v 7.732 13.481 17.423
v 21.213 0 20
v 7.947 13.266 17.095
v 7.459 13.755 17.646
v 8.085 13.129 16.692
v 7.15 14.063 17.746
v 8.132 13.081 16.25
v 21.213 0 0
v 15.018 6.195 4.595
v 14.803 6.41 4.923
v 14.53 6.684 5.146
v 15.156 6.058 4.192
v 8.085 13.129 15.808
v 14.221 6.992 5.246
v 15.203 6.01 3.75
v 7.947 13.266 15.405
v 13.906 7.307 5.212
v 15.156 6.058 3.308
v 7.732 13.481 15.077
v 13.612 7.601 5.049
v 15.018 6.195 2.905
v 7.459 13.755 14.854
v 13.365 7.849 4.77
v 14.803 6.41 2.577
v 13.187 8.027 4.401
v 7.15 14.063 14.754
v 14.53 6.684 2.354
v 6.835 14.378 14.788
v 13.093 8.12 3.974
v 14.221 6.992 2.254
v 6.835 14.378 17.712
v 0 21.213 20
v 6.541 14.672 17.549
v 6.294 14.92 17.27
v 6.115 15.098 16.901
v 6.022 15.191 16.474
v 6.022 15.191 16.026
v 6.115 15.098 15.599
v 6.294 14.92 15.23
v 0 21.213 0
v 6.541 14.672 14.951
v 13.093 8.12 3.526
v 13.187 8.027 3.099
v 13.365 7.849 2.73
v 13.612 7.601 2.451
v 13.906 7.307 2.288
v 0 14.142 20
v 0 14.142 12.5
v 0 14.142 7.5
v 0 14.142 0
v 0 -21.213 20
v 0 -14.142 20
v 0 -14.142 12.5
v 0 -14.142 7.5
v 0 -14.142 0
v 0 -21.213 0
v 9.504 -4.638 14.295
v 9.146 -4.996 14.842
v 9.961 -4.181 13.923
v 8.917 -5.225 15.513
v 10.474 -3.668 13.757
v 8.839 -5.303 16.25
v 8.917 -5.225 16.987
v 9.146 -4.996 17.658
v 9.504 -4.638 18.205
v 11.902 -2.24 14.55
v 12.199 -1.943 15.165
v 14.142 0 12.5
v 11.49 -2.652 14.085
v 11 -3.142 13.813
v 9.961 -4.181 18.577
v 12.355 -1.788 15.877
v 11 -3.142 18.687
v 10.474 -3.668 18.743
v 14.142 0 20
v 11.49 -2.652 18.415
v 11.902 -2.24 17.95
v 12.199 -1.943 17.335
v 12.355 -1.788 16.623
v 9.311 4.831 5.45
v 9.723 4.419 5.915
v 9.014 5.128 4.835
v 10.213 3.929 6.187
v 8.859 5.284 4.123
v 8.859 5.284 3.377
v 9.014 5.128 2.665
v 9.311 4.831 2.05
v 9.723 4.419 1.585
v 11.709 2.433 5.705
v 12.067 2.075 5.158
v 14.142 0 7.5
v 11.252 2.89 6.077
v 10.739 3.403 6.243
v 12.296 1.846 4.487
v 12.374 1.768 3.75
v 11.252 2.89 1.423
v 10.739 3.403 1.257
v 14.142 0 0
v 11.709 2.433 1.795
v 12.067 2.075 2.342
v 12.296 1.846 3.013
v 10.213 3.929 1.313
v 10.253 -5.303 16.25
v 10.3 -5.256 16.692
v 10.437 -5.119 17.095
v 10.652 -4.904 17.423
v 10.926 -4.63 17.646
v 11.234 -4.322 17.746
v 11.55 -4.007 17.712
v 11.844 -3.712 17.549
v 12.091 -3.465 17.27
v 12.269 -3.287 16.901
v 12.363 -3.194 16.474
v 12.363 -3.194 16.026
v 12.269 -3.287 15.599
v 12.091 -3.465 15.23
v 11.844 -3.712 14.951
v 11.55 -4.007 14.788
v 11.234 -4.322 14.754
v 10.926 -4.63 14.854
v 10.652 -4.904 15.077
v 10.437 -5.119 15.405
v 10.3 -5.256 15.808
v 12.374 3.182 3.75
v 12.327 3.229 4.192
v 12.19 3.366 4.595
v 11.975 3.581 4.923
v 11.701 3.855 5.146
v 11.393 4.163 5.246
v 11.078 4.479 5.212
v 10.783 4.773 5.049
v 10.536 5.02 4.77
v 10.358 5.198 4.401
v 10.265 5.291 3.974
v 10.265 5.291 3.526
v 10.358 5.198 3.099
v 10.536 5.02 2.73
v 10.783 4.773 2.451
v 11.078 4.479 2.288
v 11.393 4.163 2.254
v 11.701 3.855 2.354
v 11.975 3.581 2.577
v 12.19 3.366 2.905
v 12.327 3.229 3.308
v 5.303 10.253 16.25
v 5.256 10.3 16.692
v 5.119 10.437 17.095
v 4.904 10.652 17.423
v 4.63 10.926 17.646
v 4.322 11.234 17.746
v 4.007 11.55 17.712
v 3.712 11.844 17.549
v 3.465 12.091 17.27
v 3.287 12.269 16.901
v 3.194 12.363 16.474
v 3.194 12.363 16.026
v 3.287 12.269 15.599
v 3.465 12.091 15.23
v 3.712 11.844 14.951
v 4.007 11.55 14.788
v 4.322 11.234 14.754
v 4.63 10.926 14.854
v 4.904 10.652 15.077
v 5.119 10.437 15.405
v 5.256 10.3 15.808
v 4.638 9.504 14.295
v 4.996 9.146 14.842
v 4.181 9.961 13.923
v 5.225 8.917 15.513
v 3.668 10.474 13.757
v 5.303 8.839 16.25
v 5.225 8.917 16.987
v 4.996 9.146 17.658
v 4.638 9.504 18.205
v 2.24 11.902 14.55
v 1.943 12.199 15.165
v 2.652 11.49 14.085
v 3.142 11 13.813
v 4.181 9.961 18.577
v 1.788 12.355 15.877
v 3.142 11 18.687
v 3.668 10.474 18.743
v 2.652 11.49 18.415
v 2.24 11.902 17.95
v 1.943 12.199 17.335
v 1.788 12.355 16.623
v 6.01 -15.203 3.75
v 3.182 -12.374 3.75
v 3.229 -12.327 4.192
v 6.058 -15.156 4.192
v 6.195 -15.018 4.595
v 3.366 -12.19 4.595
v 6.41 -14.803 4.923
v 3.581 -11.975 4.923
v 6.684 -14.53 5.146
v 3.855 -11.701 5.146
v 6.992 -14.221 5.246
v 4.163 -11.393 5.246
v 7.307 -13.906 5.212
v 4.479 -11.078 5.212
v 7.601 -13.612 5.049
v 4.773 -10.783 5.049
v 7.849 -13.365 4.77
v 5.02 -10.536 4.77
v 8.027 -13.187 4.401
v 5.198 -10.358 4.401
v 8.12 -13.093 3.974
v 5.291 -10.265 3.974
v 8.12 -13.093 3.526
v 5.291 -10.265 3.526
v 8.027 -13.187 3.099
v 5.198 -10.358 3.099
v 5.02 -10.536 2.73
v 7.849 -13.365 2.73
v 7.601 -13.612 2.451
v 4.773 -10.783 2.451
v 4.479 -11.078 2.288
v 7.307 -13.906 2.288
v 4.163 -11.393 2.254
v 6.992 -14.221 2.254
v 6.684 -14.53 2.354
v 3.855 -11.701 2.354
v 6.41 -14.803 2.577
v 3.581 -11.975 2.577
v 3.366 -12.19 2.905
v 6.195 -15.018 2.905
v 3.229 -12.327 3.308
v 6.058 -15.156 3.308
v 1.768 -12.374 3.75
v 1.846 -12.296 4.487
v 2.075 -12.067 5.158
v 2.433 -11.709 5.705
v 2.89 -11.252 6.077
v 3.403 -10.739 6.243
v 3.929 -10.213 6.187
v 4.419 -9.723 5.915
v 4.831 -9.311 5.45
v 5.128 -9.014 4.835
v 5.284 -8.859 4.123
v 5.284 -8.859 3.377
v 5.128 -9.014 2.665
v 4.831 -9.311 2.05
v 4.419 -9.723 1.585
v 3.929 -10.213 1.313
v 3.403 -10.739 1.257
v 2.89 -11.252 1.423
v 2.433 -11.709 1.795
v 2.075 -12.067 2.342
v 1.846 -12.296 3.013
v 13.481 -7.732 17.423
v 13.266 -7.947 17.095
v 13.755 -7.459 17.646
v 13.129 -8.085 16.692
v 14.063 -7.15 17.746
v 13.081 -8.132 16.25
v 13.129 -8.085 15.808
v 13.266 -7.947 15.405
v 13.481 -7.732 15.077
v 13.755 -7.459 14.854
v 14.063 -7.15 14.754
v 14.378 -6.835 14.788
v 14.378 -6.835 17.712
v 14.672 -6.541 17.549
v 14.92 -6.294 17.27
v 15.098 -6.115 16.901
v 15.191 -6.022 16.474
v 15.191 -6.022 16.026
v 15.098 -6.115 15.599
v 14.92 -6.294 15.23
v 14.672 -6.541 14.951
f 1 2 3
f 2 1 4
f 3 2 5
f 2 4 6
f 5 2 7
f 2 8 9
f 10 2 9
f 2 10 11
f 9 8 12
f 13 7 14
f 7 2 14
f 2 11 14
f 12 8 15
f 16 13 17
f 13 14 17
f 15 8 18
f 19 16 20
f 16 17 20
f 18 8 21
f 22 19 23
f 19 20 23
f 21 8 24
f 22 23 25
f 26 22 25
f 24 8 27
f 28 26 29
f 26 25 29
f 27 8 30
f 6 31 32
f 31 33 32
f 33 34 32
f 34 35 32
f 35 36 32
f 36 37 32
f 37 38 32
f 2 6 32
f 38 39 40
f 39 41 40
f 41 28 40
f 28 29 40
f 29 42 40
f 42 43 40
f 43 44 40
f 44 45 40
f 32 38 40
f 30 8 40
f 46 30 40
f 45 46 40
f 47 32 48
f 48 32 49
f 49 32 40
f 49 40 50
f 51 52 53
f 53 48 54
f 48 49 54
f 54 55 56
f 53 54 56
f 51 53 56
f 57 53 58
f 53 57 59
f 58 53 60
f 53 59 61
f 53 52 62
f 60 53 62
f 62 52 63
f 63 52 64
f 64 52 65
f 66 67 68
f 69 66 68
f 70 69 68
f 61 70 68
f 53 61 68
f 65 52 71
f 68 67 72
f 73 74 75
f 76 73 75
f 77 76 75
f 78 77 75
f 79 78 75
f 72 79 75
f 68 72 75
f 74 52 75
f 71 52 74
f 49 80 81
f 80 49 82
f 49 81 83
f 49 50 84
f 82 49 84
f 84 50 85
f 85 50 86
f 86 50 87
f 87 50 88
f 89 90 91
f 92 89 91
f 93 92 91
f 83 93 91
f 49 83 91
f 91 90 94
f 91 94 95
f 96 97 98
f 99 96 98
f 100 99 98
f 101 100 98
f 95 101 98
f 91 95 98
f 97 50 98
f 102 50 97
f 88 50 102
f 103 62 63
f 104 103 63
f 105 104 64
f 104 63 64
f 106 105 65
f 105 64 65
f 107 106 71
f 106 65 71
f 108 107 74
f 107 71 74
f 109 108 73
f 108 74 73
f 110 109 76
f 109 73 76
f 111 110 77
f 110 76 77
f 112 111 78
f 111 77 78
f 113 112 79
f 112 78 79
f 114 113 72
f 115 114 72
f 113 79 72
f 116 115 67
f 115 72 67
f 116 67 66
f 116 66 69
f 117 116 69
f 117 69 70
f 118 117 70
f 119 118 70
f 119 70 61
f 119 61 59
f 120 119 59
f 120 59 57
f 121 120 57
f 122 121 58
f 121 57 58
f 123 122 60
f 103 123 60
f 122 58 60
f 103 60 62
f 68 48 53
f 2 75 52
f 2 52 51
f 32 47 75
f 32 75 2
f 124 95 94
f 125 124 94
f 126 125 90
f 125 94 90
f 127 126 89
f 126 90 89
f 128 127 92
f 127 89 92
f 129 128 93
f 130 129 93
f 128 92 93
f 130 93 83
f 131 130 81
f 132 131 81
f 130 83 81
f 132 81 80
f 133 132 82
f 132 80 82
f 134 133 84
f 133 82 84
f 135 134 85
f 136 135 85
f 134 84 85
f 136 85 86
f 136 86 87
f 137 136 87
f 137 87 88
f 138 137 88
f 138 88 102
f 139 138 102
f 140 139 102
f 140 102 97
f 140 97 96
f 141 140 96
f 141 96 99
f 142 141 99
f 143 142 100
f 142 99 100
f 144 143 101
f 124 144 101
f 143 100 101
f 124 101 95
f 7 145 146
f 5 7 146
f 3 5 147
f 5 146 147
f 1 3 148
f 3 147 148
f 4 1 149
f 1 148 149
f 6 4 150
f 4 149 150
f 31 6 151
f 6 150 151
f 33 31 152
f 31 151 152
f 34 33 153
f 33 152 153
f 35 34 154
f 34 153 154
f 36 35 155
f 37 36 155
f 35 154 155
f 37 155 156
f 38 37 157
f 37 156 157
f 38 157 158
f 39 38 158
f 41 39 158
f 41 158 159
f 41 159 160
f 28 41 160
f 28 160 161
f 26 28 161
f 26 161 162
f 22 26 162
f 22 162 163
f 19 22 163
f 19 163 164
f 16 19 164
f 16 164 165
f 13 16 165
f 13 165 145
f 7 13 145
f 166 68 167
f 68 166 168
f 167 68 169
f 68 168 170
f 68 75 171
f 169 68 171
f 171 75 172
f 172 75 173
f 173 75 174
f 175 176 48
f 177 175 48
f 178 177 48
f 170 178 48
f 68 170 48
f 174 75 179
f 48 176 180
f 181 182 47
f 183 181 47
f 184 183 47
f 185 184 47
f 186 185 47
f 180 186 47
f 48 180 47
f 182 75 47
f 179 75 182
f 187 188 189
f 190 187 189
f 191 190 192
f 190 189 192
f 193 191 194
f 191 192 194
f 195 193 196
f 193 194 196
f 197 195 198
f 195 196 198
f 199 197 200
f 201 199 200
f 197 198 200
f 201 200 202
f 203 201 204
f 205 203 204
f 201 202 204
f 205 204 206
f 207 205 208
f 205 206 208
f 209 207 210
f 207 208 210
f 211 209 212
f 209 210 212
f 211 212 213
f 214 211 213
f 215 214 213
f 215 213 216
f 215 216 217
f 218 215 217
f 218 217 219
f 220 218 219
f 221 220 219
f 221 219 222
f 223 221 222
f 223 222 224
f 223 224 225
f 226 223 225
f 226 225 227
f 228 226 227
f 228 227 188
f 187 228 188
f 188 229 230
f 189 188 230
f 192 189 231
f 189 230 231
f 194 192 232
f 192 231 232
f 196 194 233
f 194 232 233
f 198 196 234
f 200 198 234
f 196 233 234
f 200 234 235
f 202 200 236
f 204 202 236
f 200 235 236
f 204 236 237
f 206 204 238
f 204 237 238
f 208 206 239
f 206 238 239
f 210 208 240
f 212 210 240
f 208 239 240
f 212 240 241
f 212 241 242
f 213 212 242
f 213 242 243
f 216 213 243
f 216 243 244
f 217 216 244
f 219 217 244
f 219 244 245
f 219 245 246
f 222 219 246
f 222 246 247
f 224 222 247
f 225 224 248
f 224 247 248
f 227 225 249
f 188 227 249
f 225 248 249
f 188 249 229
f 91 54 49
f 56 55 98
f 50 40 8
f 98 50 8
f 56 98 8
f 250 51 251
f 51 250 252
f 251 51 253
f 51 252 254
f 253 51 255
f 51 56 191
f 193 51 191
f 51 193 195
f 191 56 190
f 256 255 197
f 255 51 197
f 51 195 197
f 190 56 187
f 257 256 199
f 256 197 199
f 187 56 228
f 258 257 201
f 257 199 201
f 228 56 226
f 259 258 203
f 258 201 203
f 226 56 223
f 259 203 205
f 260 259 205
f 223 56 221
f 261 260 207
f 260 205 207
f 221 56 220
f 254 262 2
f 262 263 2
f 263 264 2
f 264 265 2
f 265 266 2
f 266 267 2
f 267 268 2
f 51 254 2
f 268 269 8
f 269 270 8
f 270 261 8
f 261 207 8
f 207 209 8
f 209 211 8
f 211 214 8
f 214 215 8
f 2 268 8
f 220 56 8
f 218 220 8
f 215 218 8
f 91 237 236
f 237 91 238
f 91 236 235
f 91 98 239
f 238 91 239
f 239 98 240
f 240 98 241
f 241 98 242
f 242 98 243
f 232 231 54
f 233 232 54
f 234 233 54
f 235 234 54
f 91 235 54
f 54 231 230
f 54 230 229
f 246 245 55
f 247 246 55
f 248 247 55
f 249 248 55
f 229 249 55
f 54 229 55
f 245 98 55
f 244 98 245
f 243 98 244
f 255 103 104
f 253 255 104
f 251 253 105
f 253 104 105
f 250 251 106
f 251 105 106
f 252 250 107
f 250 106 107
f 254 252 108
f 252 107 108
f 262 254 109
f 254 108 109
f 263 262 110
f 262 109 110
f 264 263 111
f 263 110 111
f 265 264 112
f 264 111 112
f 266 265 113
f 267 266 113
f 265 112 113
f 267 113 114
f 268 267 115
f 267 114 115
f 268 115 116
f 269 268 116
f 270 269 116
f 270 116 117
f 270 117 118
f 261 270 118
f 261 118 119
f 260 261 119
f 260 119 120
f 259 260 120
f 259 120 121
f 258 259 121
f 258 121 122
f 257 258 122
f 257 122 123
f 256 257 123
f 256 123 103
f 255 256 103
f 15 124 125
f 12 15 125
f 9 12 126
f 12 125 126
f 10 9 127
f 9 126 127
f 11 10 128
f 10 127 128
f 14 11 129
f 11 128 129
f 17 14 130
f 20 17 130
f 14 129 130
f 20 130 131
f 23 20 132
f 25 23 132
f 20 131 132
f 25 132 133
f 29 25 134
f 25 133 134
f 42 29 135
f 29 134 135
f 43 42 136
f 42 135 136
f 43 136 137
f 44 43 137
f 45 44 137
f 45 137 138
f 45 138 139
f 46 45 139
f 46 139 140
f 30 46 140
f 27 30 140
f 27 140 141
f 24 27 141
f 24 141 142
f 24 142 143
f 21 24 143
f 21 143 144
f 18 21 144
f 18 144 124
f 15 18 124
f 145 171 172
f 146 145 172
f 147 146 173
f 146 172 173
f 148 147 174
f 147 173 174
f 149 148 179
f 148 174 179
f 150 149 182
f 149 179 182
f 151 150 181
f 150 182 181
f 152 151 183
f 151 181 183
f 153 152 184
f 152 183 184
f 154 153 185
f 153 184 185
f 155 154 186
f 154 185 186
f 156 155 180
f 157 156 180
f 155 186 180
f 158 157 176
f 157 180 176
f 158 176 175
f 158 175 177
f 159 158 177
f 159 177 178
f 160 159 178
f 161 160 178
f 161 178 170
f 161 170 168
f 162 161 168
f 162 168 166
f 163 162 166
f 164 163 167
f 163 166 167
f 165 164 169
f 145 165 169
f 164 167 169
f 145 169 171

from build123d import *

# Parameters (mm, degrees)
PAD_DEPTH       = 20
POCKET_DEPTH    = 7.5
POCKET001_DEPTH = 7.5
SKETCH003_R     = 1.5
POCKET002_DEPTH = 5
SKETCH004_R     = 1.5
POCKET003_DEPTH = 5
CHAMFER_SIZE    = 1


with BuildPart() as part:
    # Sketch → Pad (new body)
    with BuildSketch(Plane.XY):
        Polygon((21.213203, 0), (0, 21.213203), (0, -21.213203), align=None)
    extrude(amount=PAD_DEPTH)

    # Sketch001 (on Face5 of Pad) → Pocket (cut)
    with BuildSketch(Plane.XY.offset(20)):
        Polygon((14.142136, 0), (0, 14.142136), (0, -14.142136), align=None)
    extrude(amount=-POCKET_DEPTH, mode=Mode.SUBTRACT)

    # Sketch002 (on Face4 of Pocket) → Pocket001 (cut)
    with BuildSketch(Plane(origin=(0, 0, 0), x_dir=(1, 0, 0), z_dir=(0, 0, -1))):
        Polygon((14.142136, 0), (0, 14.142136), (0, -14.142136), align=None)
    extrude(amount=-POCKET001_DEPTH, mode=Mode.SUBTRACT)

    # Sketch003 (on Face6 of Pocket001) → Pocket002 (cut)
    with BuildSketch(Plane(origin=(7.071068, 7.071068, 0), x_dir=(0.707107, -0.707107, 0), z_dir=(-0.707107, -0.707107, 0))):
        with Locations((-5, 16.25)):
            Circle(SKETCH003_R)
        with Locations((5, 3.75)):
            Circle(SKETCH003_R)
    extrude(amount=-POCKET002_DEPTH, mode=Mode.SUBTRACT)

    # Sketch004 (on Face10 of Pocket002) → Pocket003 (cut)
    with BuildSketch(Plane(origin=(7.071068, -7.071068, 0), x_dir=(-0.707107, -0.707107, 0), z_dir=(-0.707107, 0.707107, 0))):
        with Locations((-5, 16.25)):
            Circle(SKETCH004_R)
        with Locations((5, 3.75)):
            Circle(SKETCH004_R)
    extrude(amount=-POCKET003_DEPTH, mode=Mode.SUBTRACT)

    # Chamfer
    chamfer_edges = [part.edges().sort_by_distance(p)[0] for p in [
        (11.667262, -2.474874, 16.25),
        (9.545942, 4.596194, 3.75),
        (4.596194, -9.545942, 3.75),
        (2.474874, 11.667262, 16.25),
    ]]
    chamfer(chamfer_edges, length=CHAMFER_SIZE)


solid = part.part
